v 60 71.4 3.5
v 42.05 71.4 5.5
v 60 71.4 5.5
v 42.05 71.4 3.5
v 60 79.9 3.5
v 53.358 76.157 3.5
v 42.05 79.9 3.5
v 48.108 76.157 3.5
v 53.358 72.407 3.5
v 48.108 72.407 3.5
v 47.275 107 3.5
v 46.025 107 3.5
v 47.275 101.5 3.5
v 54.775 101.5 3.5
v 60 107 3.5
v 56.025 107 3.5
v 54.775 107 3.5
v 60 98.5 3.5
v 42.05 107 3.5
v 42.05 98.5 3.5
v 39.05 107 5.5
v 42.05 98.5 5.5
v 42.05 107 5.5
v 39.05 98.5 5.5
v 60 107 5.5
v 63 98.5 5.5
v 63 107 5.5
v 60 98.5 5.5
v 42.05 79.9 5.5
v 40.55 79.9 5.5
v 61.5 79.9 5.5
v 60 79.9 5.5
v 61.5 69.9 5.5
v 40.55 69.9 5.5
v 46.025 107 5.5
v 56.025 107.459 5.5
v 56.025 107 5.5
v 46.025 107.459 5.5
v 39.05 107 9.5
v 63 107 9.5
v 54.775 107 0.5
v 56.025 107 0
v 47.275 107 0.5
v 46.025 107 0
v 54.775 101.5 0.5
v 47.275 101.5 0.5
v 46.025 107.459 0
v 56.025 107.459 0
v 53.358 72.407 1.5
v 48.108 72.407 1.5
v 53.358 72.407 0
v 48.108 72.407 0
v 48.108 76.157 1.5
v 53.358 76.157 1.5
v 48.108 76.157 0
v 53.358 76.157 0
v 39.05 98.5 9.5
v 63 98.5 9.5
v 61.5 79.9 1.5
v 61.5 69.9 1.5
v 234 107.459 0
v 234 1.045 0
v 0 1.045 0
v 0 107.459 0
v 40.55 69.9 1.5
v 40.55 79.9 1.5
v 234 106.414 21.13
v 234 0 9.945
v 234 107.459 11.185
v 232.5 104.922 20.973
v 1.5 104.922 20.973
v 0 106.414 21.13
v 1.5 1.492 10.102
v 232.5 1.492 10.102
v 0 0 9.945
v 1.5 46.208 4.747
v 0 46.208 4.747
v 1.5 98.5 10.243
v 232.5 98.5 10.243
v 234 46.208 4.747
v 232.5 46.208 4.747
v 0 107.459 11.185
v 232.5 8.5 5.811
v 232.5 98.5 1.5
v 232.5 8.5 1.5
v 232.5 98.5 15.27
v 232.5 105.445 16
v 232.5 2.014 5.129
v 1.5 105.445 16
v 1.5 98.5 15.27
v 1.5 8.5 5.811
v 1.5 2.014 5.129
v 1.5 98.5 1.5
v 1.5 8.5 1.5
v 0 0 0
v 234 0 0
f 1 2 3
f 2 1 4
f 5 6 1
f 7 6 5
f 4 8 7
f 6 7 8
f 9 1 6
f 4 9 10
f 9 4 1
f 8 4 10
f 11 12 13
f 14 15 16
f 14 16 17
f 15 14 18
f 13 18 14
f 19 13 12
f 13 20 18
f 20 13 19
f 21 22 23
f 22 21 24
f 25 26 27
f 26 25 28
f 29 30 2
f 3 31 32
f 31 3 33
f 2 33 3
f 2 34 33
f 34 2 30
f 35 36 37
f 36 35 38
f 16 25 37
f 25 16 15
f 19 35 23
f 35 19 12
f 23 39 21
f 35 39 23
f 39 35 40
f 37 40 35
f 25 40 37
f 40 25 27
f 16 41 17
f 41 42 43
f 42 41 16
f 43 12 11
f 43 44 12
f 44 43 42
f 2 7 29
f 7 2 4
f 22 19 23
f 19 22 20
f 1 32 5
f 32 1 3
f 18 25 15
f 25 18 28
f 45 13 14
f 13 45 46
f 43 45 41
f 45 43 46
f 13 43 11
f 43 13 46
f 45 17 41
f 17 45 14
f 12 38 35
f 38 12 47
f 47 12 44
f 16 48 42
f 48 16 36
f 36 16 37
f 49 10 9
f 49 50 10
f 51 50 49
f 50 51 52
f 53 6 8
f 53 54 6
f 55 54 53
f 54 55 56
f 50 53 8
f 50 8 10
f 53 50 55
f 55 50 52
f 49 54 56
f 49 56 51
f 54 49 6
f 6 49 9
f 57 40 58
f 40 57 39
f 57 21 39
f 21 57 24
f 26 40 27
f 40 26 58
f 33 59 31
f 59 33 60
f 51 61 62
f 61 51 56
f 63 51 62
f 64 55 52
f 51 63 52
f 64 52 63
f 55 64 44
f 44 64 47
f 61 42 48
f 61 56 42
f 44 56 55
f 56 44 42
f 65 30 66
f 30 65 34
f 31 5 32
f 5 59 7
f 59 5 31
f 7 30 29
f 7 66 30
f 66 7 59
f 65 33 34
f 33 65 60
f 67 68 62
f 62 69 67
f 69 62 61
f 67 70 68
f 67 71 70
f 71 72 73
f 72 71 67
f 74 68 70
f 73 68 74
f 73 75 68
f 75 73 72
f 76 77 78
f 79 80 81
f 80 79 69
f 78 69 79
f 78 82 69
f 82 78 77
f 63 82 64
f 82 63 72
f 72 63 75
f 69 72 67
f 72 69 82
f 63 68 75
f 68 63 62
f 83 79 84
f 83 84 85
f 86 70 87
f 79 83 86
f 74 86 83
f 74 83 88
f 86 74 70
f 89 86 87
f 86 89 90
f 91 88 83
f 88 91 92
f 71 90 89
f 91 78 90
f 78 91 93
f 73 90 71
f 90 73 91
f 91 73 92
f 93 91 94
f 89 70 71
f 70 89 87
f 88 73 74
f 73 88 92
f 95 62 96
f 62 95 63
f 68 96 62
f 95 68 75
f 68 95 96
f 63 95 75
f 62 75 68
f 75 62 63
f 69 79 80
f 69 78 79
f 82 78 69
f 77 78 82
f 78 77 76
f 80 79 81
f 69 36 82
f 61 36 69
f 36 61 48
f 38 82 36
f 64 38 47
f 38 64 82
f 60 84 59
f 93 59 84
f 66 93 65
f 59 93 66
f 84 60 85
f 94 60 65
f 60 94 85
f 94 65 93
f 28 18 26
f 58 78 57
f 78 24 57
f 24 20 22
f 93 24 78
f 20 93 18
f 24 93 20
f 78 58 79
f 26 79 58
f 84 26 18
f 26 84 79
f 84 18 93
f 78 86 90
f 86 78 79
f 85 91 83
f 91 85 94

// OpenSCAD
$fn = 100;

// plate dimensions
plate_thickness = 2.5;
plate_length = 250 - 19;
plate_width = 123 - 19;
hole_length = 14;
hole_width = 14;

// case dimensions
front_height = 10;
back_height = 22.25;
height_diff = front_height - back_height;
case_thickness = 1.5;
case_length =  plate_length + (case_thickness * 2);
case_width = plate_width + (case_thickness * 2);
rotate_f = 6; 


// front pieces calculations 
front_angle_b = 180 - (90 + rotate_f);
echo("front_angle_b=", front_angle_b);
front_angle_a = 180 - (90 + front_angle_b);
echo("front_angle_a=", front_angle_a);
f_front_height = front_height * ( sin(front_angle_b) / sin(90) );
echo("f_front_height=", f_front_height);
front_width = sqrt(pow(front_height, 2) - pow(f_front_height, 2));
echo("front_width=", front_width);


// back pieces calculations
back_angle_a = 180 - (90 + rotate_f);
back_bottom_length = sin(back_angle_a) * case_width;
b_back_height = sqrt(pow(case_width, 2) - pow(back_bottom_length, 2));

// teensy calculations 
pcb_length = 35.60;                                                             
pcb_width = 17.95;                                                              
pcb_height = 2;                                                              
usb_length = 5.5;                                                               
usb_width = 7.5;                                                                
usb_height = 3;                                                               
button_length = 2.5;                                                            
button_width = 3.5;                                                             
button_height = 2.5 + 1.8;                                                      

module  plate_spacing() {
  cube([
    plate_length,
    plate_width, 
    plate_height
  ]);
};
 

module cherry_mx_mount_hole (thickness) {
    color("red") cube([hole_length, hole_width, thickness]);
};

module cherry_mx_row (num_sockets, thickness) {
  for(itr = [0:num_sockets-1]) {
      translate([itr*(hole_length + 5), 0, 0]) {
          cherry_mx_mount_hole(thickness);
      };
  };
};

module cherry_mx_grid (row_num, col_num, thickness) {
    for(itr = [0:row_num-1]) {
        translate([0,itr*(hole_width + 5), 0]) {
            cherry_mx_row(col_num, thickness);
        };
    };
};

module keyboard_plate (length, width, thickness) {
    length_border = 7;
    width_border = 4;
    difference () {
        cube([length, width, thickness]);
        //cherry_mx_mount_hole(thickness);
        translate([width_border, length_border, 0]) {
            //cherry_mx_row(12, thickness);
            cherry_mx_grid(5, 12, thickness);
        };
    };
};

module keyboard_case_front () {
  polyhedron(
    points = [
      [0, 0, 0],                    // 0
      [case_length, 0, 0],          // 1
      [case_length, front_width, 0],  // 2
      [0, front_width, 0],            // 3
      [case_length, 0, f_front_height],  // 4
      [0, 0, f_front_height],            // 5
    ],
    faces = [
      [0, 1, 2, 3],
      [2, 1, 4],
      [5, 0, 3],
      [0, 5, 4, 1],
      [2, 4, 5, 3],
    ],
    convexity = 1
  );
};

module keyboard_case_back () {  
 polyhedron(
    points = [
      [0, front_width, 0],                                         // 0
      [case_length, front_width, 0],                               // 1
      [case_length, front_width + back_bottom_length, 0],               // 2
      [0, front_width + back_bottom_length, 0],                         // 3
      [case_length, front_width + back_bottom_length, b_back_height],   // 4
      [0, front_width + back_bottom_length, b_back_height],             // 5
    ],
    faces = [
      [0, 1, 2, 3],
      [2, 1, 4],
      [5, 0, 3],
      [0, 5, 4, 1],
      [2, 4, 5, 3],
    ],
    convexity = 1
  );
};


module keyboard_case (plate_length, plate_width, plate_height, angle_trn) {
  //plate catch dims
  plate_lip_width = 7;
  plate_lip_height = 10;

  chassis_space_length = case_length - (case_thickness * 2);
  chassis_space_width =  case_width - ((case_thickness * 2) + (plate_lip_width * 2));
  chassis_space_height = 50;

  teensy_catch();
  difference() {
    keyboard_chassis(plate_length, plate_width, plate_height, angle_trn);
    
    // chassis space
    translate([case_thickness, case_thickness + plate_lip_width, case_thickness]) {
      cube([chassis_space_length, chassis_space_width, chassis_space_height]);
      };

    // teensy spacing
    teensy_spacing();
    
  };
};

module keyboard_chassis (plate_length, plate_width, plate_height, angle_trn) {
  spacing_factor = 2;
  keyboard_case_front();
  keyboard_case_back();

  translate([0, angle_trn, 0]) {
    rotate([rotate_f, 0, 0]) { 
      difference() {   
        cube([case_length, case_width, front_height]);
        translate([case_thickness, case_thickness, front_height - (plate_height * spacing_factor)]) {
          cube([plate_length, plate_width, plate_height * spacing_factor]);
        };
      };
    };
  };

};

module teensy_catch () {
  catch_length = pcb_width + (case_thickness * 2);
  catch_width = 10;
  catch_height = 5.5;

  difference() {
    translate([60 - (pcb_width + case_thickness), case_width - pcb_length - case_thickness, 0])
      cube([catch_length, catch_width, catch_height]);
    teensy_spacing();
  };
};

module teensy_32 () {                                                           
    // https://www.pjrc.com/teensy/dimensions.html                              
    //pcb                                                                       
    cube([pcb_length,pcb_width, pcb_height]);                                   
                                                                                
    //usb                                                                       
    translate([0,pcb_width/2 - usb_width/2,pcb_height]) cube([usb_length, usb_width, usb_height]);
                                                                                
    //button                                                                    
    translate([2.54 + 29.97 - (button_length/2), pcb_width/2 - button_width/2, pcb_height]) 
      cube([button_length, button_width, button_height]);
                                                                                
    //usb space                                                                 
    color("red") translate([-10,pcb_width/2 -10/2,pcb_height - 2]) 
      cube([10, 10, 7.5]);
                                                                                
    //button space                                                              
    color("red") 
      translate([2.54 + 29.97 - (button_length/1.5), pcb_width/2 - button_width/1.5, pcb_height]) 
      cube([button_length * 1.5, button_width * 1.5, button_height + 10]);
                                                                                
    //pcb underspace                                                            
    pcb_buff_length = 10;                                                       
    pcb_buff_width = pcb_width + 6;                                             
    pcb_buff_height = 4;                                                        
    color("red") 
      translate([0,-((pcb_buff_width - pcb_width)/2),-pcb_buff_height]) 
      cube([pcb_buff_length,pcb_buff_width, pcb_buff_height]);
};      

module teensy_spacing() {
  translate([60, case_width,  pcb_height + case_thickness + 2]) {
    rotate([0, 180, 90]) {
      teensy_32();
    };
  };
};

//translate([0,0, 30]) {
//  rotate([top_plate_rotation, 0, 0]) {
//        keyboard_plate(plate_length, plate_width, plate_thickness);
//    };
//};

keyboard_case(plate_length, plate_width, plate_thickness, front_width);
